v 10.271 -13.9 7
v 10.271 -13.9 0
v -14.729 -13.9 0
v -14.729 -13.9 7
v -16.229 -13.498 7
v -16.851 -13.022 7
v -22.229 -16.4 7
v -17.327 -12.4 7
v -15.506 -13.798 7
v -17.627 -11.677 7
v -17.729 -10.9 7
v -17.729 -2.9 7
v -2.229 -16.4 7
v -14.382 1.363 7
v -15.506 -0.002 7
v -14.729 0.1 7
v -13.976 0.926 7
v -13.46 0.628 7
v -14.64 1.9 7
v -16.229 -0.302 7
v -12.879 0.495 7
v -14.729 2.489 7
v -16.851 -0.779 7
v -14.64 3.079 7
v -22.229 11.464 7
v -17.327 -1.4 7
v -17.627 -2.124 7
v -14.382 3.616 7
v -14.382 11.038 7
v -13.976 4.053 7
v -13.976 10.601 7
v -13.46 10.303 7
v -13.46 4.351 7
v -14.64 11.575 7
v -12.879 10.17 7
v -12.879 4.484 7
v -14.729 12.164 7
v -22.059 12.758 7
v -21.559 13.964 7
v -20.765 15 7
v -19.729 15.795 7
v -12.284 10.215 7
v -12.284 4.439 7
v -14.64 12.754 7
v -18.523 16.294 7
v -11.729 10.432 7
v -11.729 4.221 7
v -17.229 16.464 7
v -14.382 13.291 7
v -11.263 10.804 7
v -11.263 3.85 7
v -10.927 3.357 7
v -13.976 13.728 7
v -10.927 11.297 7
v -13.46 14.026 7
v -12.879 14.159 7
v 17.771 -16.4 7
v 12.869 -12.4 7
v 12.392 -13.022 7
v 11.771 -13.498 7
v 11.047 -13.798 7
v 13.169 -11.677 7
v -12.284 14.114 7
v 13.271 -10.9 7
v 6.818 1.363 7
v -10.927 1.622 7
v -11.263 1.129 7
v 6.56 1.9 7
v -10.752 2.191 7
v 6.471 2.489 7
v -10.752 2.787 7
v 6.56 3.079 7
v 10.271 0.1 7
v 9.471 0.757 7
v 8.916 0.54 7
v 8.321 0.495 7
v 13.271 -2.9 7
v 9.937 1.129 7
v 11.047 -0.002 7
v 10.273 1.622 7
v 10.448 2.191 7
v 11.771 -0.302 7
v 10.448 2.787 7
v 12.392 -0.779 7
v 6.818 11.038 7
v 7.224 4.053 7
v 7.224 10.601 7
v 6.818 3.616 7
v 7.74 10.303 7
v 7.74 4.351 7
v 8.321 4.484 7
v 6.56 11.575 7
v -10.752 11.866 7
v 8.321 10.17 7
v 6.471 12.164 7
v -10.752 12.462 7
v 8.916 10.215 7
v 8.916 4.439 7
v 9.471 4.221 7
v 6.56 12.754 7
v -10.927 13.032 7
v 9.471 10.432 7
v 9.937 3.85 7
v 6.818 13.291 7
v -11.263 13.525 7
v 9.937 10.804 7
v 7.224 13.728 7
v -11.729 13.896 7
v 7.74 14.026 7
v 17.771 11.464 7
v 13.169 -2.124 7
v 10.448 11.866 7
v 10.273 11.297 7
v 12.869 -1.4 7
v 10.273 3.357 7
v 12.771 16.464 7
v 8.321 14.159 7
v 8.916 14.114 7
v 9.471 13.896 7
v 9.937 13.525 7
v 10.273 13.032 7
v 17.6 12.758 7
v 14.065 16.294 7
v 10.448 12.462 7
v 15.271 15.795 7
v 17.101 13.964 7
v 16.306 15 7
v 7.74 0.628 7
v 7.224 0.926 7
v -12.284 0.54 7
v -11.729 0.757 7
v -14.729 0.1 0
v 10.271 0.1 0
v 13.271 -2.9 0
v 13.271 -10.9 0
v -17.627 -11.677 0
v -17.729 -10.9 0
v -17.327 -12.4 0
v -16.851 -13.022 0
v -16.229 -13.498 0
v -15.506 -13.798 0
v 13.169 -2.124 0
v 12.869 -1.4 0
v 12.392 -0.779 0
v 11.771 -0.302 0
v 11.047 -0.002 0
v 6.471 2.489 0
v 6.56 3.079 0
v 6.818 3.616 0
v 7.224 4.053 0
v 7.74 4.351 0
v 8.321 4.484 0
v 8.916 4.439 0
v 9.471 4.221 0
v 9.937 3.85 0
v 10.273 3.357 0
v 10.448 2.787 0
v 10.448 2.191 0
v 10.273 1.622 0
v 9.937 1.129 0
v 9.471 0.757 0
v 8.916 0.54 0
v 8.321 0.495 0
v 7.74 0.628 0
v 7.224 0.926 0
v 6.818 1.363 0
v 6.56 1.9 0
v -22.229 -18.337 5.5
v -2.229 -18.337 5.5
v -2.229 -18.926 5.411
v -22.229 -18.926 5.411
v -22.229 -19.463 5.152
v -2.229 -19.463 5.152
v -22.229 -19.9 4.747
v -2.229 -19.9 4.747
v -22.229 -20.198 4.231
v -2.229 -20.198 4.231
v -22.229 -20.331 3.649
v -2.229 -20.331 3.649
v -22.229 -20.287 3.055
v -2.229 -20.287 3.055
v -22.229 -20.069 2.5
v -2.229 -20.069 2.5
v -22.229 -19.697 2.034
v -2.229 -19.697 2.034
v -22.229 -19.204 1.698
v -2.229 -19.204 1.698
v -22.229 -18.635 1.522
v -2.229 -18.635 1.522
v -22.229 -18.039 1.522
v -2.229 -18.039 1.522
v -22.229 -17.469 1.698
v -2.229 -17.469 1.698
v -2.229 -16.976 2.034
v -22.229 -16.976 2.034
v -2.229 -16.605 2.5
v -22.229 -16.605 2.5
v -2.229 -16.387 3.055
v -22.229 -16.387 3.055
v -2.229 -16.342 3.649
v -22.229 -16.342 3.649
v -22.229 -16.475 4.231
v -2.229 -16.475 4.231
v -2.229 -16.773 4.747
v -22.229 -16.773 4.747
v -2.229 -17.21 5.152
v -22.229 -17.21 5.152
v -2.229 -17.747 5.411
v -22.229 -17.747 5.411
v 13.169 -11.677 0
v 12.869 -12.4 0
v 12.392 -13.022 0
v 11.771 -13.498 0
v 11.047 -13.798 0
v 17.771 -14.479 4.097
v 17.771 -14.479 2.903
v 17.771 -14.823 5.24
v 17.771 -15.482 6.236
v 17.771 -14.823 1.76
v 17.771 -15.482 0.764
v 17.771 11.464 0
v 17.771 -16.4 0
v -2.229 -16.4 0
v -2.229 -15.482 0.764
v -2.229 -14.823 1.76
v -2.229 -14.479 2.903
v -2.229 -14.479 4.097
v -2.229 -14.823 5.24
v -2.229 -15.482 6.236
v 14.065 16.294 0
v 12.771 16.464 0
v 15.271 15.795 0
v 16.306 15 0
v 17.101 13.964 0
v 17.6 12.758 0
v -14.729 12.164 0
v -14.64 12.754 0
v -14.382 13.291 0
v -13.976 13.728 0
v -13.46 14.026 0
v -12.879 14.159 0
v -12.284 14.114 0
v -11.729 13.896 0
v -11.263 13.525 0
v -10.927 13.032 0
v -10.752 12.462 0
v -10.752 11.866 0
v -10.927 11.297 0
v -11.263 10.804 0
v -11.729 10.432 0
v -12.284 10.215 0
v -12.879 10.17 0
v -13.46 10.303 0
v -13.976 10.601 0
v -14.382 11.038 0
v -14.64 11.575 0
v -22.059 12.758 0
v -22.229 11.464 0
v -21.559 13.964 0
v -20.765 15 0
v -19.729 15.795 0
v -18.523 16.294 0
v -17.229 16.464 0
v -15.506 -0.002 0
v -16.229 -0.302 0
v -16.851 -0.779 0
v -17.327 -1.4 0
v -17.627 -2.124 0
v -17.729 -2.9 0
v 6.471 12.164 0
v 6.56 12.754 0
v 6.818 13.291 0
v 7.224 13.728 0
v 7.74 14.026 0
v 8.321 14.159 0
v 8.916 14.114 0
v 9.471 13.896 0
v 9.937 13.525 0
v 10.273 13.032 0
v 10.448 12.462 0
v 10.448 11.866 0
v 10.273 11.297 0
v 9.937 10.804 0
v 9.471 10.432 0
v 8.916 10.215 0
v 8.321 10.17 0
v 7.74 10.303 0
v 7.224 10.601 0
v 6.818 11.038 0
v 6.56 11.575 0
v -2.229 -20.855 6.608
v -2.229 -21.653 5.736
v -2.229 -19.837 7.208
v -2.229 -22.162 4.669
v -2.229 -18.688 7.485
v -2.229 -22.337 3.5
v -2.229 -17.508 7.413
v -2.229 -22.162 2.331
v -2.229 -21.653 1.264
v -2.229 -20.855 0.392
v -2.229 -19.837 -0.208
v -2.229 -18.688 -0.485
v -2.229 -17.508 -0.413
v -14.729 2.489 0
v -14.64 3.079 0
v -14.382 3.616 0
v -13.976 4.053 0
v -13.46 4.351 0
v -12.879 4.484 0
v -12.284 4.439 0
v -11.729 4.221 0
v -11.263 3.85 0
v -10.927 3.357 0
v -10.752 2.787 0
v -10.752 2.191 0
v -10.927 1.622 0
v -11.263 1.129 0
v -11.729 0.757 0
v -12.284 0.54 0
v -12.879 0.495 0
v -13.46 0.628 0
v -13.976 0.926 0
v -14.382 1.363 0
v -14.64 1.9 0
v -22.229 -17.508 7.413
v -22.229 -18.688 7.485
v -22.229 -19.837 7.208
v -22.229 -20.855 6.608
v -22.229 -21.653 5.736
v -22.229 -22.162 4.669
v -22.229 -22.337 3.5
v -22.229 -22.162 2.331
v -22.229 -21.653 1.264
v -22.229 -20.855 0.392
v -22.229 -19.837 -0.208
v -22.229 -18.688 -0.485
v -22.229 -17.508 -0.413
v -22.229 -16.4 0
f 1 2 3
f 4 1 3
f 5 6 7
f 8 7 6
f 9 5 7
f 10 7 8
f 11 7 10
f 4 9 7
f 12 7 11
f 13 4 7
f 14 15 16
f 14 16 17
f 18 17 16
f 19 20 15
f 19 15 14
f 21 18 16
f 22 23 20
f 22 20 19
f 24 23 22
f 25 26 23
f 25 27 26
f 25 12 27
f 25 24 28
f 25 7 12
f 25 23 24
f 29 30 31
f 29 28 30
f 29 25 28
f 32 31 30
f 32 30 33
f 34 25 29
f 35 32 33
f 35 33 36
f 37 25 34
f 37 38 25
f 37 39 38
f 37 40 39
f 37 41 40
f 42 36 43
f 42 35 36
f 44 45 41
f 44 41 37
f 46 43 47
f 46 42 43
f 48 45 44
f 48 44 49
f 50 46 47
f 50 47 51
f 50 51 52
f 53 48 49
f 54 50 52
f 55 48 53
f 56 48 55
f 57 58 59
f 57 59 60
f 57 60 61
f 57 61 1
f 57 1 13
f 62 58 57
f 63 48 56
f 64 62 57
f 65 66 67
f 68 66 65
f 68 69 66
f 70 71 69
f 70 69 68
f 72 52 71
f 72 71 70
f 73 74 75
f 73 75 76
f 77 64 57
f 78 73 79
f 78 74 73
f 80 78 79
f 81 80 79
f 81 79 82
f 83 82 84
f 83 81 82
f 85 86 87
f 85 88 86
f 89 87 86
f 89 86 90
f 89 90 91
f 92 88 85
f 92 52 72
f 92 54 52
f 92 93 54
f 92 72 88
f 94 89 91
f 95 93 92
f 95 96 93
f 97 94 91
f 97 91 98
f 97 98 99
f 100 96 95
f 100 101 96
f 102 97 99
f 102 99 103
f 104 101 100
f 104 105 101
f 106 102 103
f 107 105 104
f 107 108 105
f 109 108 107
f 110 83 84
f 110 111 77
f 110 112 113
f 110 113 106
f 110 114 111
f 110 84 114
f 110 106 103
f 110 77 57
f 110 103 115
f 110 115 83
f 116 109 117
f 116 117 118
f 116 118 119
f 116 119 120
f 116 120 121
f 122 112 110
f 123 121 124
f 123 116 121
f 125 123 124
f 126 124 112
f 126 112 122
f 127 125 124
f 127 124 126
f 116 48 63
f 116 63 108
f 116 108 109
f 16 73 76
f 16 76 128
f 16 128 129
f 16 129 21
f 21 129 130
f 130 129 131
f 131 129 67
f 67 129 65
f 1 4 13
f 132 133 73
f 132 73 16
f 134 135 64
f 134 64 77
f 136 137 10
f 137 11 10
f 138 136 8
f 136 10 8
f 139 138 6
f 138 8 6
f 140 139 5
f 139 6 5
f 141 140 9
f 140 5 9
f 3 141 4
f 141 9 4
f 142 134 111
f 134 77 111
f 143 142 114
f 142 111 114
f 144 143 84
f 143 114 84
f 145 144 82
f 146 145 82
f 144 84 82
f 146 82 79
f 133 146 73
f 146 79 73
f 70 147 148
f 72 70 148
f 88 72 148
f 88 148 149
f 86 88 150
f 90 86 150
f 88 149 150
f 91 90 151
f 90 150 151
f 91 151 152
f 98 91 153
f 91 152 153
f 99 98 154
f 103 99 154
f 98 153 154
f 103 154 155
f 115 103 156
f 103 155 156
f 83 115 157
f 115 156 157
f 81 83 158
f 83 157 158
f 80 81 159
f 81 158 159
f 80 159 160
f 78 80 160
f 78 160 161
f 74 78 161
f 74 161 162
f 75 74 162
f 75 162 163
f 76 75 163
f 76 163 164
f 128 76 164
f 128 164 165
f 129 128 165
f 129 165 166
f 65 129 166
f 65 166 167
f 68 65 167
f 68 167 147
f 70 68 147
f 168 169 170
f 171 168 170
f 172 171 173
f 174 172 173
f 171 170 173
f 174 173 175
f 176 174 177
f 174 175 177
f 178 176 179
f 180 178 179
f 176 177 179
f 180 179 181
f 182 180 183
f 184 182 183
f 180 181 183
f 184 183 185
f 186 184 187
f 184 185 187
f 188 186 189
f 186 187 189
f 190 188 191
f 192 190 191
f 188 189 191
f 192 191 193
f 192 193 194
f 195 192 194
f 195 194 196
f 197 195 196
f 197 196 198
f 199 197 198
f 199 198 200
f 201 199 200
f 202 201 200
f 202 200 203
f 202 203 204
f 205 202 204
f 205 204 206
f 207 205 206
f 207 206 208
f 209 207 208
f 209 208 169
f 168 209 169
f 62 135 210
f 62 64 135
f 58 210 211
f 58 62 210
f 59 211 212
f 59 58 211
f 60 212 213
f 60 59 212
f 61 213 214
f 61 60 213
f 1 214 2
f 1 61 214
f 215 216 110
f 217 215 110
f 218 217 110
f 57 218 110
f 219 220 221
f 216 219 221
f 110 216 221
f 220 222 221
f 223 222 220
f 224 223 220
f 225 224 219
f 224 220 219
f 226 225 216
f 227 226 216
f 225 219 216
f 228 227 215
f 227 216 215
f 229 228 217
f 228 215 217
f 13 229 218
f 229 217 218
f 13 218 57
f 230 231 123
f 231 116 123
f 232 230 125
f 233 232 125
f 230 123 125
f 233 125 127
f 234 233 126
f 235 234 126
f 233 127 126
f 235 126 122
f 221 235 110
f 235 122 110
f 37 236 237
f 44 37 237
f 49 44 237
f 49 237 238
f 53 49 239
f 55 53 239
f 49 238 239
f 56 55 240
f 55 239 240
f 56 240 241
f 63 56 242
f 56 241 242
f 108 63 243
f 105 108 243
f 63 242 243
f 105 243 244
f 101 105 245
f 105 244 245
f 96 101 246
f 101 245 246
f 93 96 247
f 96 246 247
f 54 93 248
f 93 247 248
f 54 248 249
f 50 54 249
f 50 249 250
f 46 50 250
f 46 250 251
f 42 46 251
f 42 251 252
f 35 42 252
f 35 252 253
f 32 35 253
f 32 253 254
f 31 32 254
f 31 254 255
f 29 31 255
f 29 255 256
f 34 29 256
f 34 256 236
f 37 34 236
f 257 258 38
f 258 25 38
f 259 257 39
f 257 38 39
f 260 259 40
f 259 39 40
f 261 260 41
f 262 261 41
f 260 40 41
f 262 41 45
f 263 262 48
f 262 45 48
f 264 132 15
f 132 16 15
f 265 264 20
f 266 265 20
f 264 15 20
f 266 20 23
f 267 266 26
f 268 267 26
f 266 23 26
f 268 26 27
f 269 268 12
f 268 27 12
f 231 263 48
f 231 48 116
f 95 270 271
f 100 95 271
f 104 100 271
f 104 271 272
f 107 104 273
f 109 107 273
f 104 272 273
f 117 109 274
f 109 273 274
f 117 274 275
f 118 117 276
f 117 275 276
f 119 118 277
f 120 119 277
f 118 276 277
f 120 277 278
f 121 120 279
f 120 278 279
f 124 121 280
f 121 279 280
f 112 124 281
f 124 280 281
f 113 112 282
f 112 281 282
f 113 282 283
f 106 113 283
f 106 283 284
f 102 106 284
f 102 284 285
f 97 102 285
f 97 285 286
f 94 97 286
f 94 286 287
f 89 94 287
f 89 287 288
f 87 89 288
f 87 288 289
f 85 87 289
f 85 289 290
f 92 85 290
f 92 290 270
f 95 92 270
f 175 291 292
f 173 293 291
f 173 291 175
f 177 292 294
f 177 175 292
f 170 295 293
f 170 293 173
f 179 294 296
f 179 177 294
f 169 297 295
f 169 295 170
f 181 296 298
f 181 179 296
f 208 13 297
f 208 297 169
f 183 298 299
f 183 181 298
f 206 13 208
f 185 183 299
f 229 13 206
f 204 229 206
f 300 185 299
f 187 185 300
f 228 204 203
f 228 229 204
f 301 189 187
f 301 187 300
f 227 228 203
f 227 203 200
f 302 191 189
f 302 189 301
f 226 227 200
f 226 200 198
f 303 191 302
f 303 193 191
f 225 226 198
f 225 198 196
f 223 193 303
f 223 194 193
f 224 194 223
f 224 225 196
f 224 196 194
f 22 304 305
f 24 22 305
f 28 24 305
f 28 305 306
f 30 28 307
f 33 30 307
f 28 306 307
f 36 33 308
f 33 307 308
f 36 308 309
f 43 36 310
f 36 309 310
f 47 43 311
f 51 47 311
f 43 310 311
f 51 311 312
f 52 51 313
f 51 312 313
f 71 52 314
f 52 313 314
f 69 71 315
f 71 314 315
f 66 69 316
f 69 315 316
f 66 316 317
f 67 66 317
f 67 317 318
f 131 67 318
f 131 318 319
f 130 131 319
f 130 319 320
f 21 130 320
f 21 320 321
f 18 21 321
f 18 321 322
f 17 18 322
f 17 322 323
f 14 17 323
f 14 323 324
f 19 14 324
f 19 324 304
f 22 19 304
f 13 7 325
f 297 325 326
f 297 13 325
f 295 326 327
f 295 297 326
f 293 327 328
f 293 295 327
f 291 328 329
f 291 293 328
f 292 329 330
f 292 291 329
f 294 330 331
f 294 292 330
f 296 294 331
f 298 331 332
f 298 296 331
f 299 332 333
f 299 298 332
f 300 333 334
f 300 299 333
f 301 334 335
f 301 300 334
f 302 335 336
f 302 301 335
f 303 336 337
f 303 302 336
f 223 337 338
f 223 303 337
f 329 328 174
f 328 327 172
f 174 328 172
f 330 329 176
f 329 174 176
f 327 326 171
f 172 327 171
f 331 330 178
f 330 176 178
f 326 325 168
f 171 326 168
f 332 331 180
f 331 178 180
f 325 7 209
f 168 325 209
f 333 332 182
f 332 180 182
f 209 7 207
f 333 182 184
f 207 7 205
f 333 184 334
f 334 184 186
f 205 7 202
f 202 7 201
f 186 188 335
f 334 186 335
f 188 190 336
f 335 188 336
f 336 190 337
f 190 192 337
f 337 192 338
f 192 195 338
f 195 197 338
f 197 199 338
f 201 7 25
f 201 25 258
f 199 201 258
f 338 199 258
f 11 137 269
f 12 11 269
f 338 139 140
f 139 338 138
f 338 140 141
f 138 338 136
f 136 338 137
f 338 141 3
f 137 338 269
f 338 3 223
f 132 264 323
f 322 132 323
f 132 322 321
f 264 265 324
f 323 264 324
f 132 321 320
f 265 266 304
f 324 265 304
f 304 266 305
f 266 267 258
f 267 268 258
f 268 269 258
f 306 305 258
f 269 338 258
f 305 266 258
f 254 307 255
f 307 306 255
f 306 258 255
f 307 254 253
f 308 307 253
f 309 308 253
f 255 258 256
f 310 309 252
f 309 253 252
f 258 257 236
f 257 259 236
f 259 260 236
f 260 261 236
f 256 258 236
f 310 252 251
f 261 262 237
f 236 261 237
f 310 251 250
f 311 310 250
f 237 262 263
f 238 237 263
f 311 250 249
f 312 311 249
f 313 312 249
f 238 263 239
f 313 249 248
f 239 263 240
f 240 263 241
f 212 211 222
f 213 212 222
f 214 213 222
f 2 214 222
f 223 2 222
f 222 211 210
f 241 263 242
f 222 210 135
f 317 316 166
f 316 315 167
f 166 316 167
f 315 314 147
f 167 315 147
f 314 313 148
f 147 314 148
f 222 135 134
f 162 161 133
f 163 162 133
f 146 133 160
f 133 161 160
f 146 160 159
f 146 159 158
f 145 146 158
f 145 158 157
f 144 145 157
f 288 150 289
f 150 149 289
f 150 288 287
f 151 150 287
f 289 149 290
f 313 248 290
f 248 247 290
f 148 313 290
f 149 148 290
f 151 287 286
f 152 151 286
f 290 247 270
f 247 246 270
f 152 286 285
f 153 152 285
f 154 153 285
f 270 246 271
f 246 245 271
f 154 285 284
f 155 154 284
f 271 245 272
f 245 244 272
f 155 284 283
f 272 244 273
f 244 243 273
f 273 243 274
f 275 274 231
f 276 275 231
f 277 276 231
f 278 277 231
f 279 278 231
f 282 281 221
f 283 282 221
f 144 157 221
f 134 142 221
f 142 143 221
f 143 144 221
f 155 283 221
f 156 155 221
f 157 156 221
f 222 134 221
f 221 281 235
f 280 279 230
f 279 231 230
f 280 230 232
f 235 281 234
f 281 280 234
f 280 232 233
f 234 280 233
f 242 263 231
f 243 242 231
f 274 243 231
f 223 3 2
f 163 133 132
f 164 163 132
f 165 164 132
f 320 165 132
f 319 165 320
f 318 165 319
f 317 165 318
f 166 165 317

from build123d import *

# Parameters (mm, degrees)
SKETCH1_W                = 40
SKETCH1_H                = 35
BOSS_EXTRUDE1_DEPTH      = 7
SKETCH2_R                = 4.1
CUT_EXTRUDE1_DEPTH       = 20
SKETCH3_R                = 4
SKETCH3_R_2              = 2
BOSS_EXTRUDE2_DEPTH      = 11
BOSS_EXTRUDE2_DEPTH_BACK = 9
FILLET1_R                = 5
SKETCH4_R                = 2
SKETCH4_W                = 31
SKETCH4_H                = 14
CUT_EXTRUDE2_DEPTH       = 8.5
FILLET2_R                = 3
SKETCH5_R                = 2
CUT_EXTRUDE3_DEPTH       = 41


with BuildPart() as part:
    # Sketch1 → Boss-Extrude1 (new body)
    with BuildSketch(Plane.XY):
        with Locations((-2.229213179, -1.035620053)):
            Rectangle(SKETCH1_W, SKETCH1_H)
    extrude(amount=BOSS_EXTRUDE1_DEPTH)

    # Sketch2 → Cut-Extrude1 (cut)
    with BuildSketch(Plane(origin=(17.770786821, 0, 0), x_dir=(0, 0, -1), z_dir=(1, 0, 0))):
        with Locations((-3.5, -18.535620053)):
            Circle(SKETCH2_R)
    extrude(amount=-CUT_EXTRUDE1_DEPTH, mode=Mode.SUBTRACT)

    # Sketch3 → Boss-Extrude2 (add, two sides)
    with BuildSketch(Plane(origin=(-13.229213179, 0, 0), x_dir=(0, 0, -1), z_dir=(1, 0, 0))) as boss_extrude2_sk:
        with Locations((-3.5, -18.336696075)):
            Circle(SKETCH3_R)
        with Locations((-3.5, -18.336696075)):
            Circle(SKETCH3_R_2, mode=Mode.SUBTRACT)
    extrude(amount=BOSS_EXTRUDE2_DEPTH)
    extrude(boss_extrude2_sk.sketch, amount=-BOSS_EXTRUDE2_DEPTH_BACK)

    # Fillet1
    fillet1_edges = [part.edges().sort_by_distance(p)[0] for p in [
        (-22.229213179, 16.464379947, 3.5),
        (17.770786821, 16.464379947, 3.5),
    ]]
    fillet(fillet1_edges, radius=FILLET1_R)

    # Sketch4 → Cut-Extrude2 (cut, through all)
    with BuildSketch(Plane(origin=(0, 0, 0), x_dir=(-1, 0, 0), z_dir=(0, 0, -1))):
        with Locations((-8.470786821, 12.164379947)):
            Circle(SKETCH4_R)
        with Locations((12.729213179, 12.164379947)):
            Circle(SKETCH4_R)
        with Locations((12.729213179, 2.489379947)):
            Circle(SKETCH4_R)
        with Locations((-8.470786821, 2.489379947)):
            Circle(SKETCH4_R)
        with Locations((2.229213179, -6.900204402)):
            Rectangle(SKETCH4_W, SKETCH4_H)
    extrude(amount=-CUT_EXTRUDE2_DEPTH, mode=Mode.SUBTRACT)

    # Fillet2
    fillet2_edges = [part.edges().sort_by_distance(p)[0] for p in [
        (-17.729213179, 0.099795598, 3.5),
        (-17.729213179, -13.900204402, 3.5),
        (13.270786821, -13.900204402, 3.5),
        (13.270786821, 0.099795598, 3.5),
    ]]
    fillet(fillet2_edges, radius=FILLET2_R)

    # Sketch5 → Cut-Extrude3 (cut, through all)
    with BuildSketch(Plane.ZY.offset(22.229213179)):
        with Locations((3.5, -18.336696075)):
            Circle(SKETCH5_R)
    extrude(amount=-CUT_EXTRUDE3_DEPTH, mode=Mode.SUBTRACT)


solid = part.part
